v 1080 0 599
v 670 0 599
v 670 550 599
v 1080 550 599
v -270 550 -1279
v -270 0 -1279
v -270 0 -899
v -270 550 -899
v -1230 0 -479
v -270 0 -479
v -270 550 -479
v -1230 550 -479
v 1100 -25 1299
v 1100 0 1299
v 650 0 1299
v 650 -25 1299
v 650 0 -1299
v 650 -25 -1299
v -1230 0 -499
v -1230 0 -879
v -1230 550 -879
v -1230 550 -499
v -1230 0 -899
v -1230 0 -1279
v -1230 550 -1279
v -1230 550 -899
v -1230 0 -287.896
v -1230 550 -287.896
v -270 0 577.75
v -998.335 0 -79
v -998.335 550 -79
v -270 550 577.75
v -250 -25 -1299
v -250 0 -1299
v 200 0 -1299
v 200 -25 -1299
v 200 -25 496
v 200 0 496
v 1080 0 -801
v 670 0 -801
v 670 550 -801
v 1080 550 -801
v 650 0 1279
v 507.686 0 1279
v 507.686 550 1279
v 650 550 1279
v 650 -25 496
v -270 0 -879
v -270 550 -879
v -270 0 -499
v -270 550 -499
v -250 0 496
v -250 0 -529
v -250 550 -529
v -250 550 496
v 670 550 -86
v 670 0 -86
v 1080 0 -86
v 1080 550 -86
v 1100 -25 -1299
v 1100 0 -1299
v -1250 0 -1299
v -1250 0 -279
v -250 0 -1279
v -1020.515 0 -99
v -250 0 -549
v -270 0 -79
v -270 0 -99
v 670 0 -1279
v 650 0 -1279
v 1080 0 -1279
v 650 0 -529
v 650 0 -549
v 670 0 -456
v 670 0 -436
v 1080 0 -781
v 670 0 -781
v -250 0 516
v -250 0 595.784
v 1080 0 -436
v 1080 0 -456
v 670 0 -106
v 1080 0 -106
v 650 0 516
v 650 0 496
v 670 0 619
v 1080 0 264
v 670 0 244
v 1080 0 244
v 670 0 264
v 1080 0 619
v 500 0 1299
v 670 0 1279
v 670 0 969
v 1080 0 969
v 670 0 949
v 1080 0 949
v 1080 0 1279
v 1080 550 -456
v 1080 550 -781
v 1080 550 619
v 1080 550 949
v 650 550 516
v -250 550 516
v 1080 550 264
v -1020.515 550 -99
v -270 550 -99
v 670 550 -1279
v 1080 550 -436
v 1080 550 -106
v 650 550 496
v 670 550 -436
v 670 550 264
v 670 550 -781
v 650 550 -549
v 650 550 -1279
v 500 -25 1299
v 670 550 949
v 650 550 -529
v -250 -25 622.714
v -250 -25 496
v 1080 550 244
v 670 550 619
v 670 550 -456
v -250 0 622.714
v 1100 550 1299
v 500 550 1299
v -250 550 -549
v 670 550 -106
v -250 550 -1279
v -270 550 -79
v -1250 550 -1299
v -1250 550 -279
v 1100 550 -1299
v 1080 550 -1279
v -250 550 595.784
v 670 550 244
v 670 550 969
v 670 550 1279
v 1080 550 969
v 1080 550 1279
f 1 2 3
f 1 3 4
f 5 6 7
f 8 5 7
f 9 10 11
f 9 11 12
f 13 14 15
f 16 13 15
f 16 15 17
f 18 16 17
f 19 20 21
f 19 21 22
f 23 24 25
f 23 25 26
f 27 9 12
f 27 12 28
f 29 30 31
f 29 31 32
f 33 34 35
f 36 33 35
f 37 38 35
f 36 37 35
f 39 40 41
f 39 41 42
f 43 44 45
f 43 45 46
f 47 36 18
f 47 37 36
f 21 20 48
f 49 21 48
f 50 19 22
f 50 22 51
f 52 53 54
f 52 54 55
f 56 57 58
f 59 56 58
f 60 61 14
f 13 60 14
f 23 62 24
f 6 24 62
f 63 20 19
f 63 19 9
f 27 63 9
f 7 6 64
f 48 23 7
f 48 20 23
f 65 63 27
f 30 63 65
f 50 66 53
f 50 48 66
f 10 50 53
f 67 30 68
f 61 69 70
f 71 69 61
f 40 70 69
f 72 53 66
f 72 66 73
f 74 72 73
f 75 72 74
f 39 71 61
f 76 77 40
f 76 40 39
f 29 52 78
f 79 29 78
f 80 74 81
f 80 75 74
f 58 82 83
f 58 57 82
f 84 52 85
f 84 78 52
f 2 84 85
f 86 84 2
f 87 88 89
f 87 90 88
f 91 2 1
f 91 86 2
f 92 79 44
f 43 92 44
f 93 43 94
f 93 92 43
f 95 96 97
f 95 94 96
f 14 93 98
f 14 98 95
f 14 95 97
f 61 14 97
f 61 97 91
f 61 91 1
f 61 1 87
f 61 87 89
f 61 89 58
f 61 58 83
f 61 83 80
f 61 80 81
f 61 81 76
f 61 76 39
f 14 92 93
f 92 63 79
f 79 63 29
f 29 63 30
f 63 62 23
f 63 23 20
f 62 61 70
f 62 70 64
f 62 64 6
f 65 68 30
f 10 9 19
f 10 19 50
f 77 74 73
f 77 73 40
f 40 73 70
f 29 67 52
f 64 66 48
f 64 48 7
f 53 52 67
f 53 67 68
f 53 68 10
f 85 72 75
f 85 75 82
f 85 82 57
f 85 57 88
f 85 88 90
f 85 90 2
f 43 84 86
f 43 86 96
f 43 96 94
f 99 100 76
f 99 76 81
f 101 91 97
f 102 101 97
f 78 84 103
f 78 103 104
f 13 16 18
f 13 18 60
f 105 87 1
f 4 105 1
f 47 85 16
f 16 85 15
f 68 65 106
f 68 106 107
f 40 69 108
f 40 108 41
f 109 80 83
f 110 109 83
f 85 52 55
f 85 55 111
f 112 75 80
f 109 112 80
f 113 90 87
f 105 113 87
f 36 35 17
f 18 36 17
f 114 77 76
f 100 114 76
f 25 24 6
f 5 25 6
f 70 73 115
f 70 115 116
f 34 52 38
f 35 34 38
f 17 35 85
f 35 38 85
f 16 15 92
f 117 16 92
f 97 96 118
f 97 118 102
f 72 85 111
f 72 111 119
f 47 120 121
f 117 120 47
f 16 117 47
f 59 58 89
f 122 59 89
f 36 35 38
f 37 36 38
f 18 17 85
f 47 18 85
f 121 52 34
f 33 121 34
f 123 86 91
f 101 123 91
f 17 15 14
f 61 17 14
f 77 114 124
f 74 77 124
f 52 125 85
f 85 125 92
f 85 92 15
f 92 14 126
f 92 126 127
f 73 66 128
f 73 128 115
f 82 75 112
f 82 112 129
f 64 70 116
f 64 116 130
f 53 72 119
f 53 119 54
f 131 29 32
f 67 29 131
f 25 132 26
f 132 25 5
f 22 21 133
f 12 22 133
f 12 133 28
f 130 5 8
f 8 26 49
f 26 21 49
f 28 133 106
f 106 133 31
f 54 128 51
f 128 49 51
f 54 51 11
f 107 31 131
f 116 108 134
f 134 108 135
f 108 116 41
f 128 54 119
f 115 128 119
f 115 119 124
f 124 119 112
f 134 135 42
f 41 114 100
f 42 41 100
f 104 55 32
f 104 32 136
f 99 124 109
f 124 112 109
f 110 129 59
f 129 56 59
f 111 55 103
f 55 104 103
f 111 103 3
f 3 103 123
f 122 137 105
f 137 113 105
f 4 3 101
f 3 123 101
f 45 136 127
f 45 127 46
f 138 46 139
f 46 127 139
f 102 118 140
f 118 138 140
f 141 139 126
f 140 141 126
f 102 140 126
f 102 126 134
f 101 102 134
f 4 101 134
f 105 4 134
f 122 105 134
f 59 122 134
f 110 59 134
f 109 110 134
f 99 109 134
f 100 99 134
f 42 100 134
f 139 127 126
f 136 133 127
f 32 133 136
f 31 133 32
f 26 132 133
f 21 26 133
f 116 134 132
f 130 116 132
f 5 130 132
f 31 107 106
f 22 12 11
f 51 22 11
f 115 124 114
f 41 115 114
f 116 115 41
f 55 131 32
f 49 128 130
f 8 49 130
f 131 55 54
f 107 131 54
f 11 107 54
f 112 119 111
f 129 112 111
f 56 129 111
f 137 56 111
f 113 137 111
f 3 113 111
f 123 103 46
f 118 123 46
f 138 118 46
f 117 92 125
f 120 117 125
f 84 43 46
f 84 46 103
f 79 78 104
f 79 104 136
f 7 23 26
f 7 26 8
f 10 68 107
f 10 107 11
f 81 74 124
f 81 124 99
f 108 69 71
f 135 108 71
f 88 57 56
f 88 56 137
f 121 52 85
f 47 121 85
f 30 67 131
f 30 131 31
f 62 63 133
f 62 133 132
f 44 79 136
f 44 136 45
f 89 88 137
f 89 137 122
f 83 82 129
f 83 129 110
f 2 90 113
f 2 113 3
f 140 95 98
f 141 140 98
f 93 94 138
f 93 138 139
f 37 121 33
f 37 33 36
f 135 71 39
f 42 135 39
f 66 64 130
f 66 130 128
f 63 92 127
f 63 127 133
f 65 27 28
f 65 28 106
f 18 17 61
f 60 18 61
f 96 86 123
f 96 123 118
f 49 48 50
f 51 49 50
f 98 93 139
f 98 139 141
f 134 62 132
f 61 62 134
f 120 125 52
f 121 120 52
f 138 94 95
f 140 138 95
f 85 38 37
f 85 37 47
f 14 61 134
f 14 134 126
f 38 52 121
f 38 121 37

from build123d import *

# Parameters (mm, degrees)
F0_W     = 410
F0_H     = 478
F0_H_2   = 325
F0_H_3   = 330
F0_H_4   = 335
F0_H_5   = 310
F0_W_2   = 960
F0_H_6   = 380
F0_W_3   = 450
F0_H_7   = 20
F1_DEPTH = 550
F2_DEPTH = 25
F0_H_8   = 54.7284266949
F0_H_9   = 960.2715733051
F0_H_10  = 10
F0_H_11  = 250
F0_H_12  = 230
F3_DEPTH = 25
F4_DEPTH = 25
F5_DEPTH = 25


# Not quite as in the source:
# - a feature names something its author has since deleted; it is built from what else it names


with BuildPart() as f1:
    # F0 (on Front) → F1 (new body)
    with BuildSketch(Plane.XZ):
        Polygon((650, 1299), (500, 1299), (200, 1028.4857142857), (200, 1001.5555181998), (507.6855786757, 1279), (650, 1279), align=None)
        Polygon((1100, 1299), (650, 1299), (650, 1279), (650, 516), (650, 496), (650, 441.2715733051), (650, 431.2715733051), (650, -529), (650, -549), (650, -799), (650, -1049), (650, -1279), (650, -1299), (1100, -1299), (1100, -456), (1100, -436), align=None)
        with Locations((875, -1040)):
            Rectangle(F0_W, F0_H, mode=Mode.SUBTRACT)
        with Locations((875, -618.5)):
            Rectangle(F0_W, F0_H_2, mode=Mode.SUBTRACT)
        with Locations((875, -271)):
            Rectangle(F0_W, F0_H_3, mode=Mode.SUBTRACT)
        with Locations((875, 79)):
            Rectangle(F0_W, F0_H_3, mode=Mode.SUBTRACT)
        with Locations((875, 431.5)):
            Rectangle(F0_W, F0_H_4, mode=Mode.SUBTRACT)
        with Locations((875, 784)):
            Rectangle(F0_W, F0_H_3, mode=Mode.SUBTRACT)
        with Locations((875, 1124)):
            Rectangle(F0_W, F0_H_5, mode=Mode.SUBTRACT)
        Polygon((200, 1001.5555181998), (200, 1028.4857142857), (-250, 622.7142857143), (-250, 595.7840896284), align=None)
        Polygon((-250, 595.7840896284), (-250, 622.7142857143), (-1250, -279), (-1250, -479), (-1247.8080965606, -479), (-1230, -462.9421849299), (-1230, -287.8959103716), (-1020.5146748097, -99), (-998.3347001582, -79), (-270, 577.7498039141), align=None)
        Polygon((-250, 516), (-250, 595.7840896284), (-270, 577.7498039141), (-270, -79), (-998.3347001582, -79), (-1020.5146748097, -99), (-270, -99), (-270, -479), (-1230, -479), (-1230, -462.9421849299), (-1247.8080965606, -479), (-1250, -480.9764706442), (-1250, -1299), (-250, -1299), (-250, -1279), (-250, -1049), (-250, -899), (-250, -879), (-250, -799), (-250, -549), (-250, -529), (-250, 431.2715733051), (-250, 441.2715733051), (-250, 496), align=None)
        with Locations((-750, -1089)):
            Rectangle(F0_W_2, F0_H_6, mode=Mode.SUBTRACT)
        with Locations((-750, -689)):
            Rectangle(F0_W_2, F0_H_6, mode=Mode.SUBTRACT)
        Polygon((-1247.8080965606, -479), (-1250, -479), (-1250, -480.9764706442), align=None)
        with Locations((425, -1289)):
            Rectangle(F0_W_3, F0_H_7)
        with Locations((-25, -1289)):
            Rectangle(F0_W_3, F0_H_7)
        with Locations((-25, -539)):
            Rectangle(F0_W_3, F0_H_7)
        with Locations((425, -539)):
            Rectangle(F0_W_3, F0_H_7)
        with Locations((425, 506)):
            Rectangle(F0_W_3, F0_H_7)
        with Locations((-25, 506)):
            Rectangle(F0_W_3, F0_H_7)
    extrude(amount=-F1_DEPTH)


with BuildPart() as f2:
    # F0 (on Front) → F2 (new body)
    with BuildSketch(Plane.XZ):
        Polygon((200, 516), (200, 1001.5555181998), (-250, 595.7840896284), (-250, 516), align=None)
        with Locations((-25, 506)):
            Rectangle(F0_W_3, F0_H_7)
        Polygon((650, 516), (650, 1279), (507.6855786757, 1279), (200, 1001.5555181998), (200, 516), align=None)
        with Locations((425, 506)):
            Rectangle(F0_W_3, F0_H_7)
        Polygon((200, 1001.5555181998), (200, 1028.4857142857), (-250, 622.7142857143), (-250, 595.7840896284), align=None)
        Polygon((650, 1299), (500, 1299), (200, 1028.4857142857), (200, 1001.5555181998), (507.6855786757, 1279), (650, 1279), align=None)
    extrude(amount=F2_DEPTH)


with BuildPart() as f3:
    # F0 (on Front) → F3 (new body)
    with BuildSketch(Plane.XZ):
        with Locations((-25, 468.6357866526)):
            Rectangle(F0_W_3, F0_H_8)
        with Locations((-25, -48.8642133474)):
            Rectangle(F0_W_3, F0_H_9)
        with Locations((-25, 436.2715733051)):
            Rectangle(F0_W_3, F0_H_10)
        with Locations((-25, -674)):
            Rectangle(F0_W_3, F0_H_11)
        Polygon((-250, -1049), (200, -1049), (200, -799), (-250, -799), (-250, -879), (-250, -899), align=None)
        with Locations((-25, -1164)):
            Rectangle(F0_W_3, F0_H_12)
        with Locations((-25, -539)):
            Rectangle(F0_W_3, F0_H_7)
        with Locations((-25, -1289)):
            Rectangle(F0_W_3, F0_H_7)
    extrude(amount=F3_DEPTH)


with BuildPart() as f4:
    # F0 (on Front) → F4 (new body)
    with BuildSketch(Plane.XZ):
        with Locations((425, -1164)):
            Rectangle(F0_W_3, F0_H_12)
        with Locations((425, -924)):
            Rectangle(F0_W_3, F0_H_11)
        with Locations((425, -1289)):
            Rectangle(F0_W_3, F0_H_7)
        with Locations((425, -674)):
            Rectangle(F0_W_3, F0_H_11)
        with Locations((425, -539)):
            Rectangle(F0_W_3, F0_H_7)
        with Locations((425, -48.8642133474)):
            Rectangle(F0_W_3, F0_H_9)
        with Locations((425, 468.6357866526)):
            Rectangle(F0_W_3, F0_H_8)
        with Locations((425, 436.2715733051)):
            Rectangle(F0_W_3, F0_H_10)
    extrude(amount=F4_DEPTH)


with BuildPart() as f5:
    # F0 (on Front) → F5 (new body)
    with BuildSketch(Plane.XZ):
        Polygon((1100, 1299), (650, 1299), (650, 1279), (650, 516), (650, 496), (650, 441.2715733051), (650, 431.2715733051), (650, -529), (650, -549), (650, -799), (650, -1049), (650, -1279), (650, -1299), (1100, -1299), (1100, -456), (1100, -436), align=None)
        with Locations((875, -1040)):
            Rectangle(F0_W, F0_H, mode=Mode.SUBTRACT)
        with Locations((875, -618.5)):
            Rectangle(F0_W, F0_H_2, mode=Mode.SUBTRACT)
        with Locations((875, -271)):
            Rectangle(F0_W, F0_H_3, mode=Mode.SUBTRACT)
        with Locations((875, 79)):
            Rectangle(F0_W, F0_H_3, mode=Mode.SUBTRACT)
        with Locations((875, 431.5)):
            Rectangle(F0_W, F0_H_4, mode=Mode.SUBTRACT)
        with Locations((875, 784)):
            Rectangle(F0_W, F0_H_3, mode=Mode.SUBTRACT)
        with Locations((875, 1124)):
            Rectangle(F0_W, F0_H_5, mode=Mode.SUBTRACT)
        with Locations((875, -1040)):
            Rectangle(F0_W, F0_H)
        with Locations((875, 431.5)):
            Rectangle(F0_W, F0_H_4)
        with Locations((875, 784)):
            Rectangle(F0_W, F0_H_3)
        with Locations((875, 79)):
            Rectangle(F0_W, F0_H_3)
        with Locations((875, -271)):
            Rectangle(F0_W, F0_H_3)
        with Locations((875, -618.5)):
            Rectangle(F0_W, F0_H_2)
        with Locations((875, 1124)):
            Rectangle(F0_W, F0_H_5)
    extrude(amount=F5_DEPTH)


solid = Compound([f1.part, f2.part, f3.part, f4.part, f5.part])
